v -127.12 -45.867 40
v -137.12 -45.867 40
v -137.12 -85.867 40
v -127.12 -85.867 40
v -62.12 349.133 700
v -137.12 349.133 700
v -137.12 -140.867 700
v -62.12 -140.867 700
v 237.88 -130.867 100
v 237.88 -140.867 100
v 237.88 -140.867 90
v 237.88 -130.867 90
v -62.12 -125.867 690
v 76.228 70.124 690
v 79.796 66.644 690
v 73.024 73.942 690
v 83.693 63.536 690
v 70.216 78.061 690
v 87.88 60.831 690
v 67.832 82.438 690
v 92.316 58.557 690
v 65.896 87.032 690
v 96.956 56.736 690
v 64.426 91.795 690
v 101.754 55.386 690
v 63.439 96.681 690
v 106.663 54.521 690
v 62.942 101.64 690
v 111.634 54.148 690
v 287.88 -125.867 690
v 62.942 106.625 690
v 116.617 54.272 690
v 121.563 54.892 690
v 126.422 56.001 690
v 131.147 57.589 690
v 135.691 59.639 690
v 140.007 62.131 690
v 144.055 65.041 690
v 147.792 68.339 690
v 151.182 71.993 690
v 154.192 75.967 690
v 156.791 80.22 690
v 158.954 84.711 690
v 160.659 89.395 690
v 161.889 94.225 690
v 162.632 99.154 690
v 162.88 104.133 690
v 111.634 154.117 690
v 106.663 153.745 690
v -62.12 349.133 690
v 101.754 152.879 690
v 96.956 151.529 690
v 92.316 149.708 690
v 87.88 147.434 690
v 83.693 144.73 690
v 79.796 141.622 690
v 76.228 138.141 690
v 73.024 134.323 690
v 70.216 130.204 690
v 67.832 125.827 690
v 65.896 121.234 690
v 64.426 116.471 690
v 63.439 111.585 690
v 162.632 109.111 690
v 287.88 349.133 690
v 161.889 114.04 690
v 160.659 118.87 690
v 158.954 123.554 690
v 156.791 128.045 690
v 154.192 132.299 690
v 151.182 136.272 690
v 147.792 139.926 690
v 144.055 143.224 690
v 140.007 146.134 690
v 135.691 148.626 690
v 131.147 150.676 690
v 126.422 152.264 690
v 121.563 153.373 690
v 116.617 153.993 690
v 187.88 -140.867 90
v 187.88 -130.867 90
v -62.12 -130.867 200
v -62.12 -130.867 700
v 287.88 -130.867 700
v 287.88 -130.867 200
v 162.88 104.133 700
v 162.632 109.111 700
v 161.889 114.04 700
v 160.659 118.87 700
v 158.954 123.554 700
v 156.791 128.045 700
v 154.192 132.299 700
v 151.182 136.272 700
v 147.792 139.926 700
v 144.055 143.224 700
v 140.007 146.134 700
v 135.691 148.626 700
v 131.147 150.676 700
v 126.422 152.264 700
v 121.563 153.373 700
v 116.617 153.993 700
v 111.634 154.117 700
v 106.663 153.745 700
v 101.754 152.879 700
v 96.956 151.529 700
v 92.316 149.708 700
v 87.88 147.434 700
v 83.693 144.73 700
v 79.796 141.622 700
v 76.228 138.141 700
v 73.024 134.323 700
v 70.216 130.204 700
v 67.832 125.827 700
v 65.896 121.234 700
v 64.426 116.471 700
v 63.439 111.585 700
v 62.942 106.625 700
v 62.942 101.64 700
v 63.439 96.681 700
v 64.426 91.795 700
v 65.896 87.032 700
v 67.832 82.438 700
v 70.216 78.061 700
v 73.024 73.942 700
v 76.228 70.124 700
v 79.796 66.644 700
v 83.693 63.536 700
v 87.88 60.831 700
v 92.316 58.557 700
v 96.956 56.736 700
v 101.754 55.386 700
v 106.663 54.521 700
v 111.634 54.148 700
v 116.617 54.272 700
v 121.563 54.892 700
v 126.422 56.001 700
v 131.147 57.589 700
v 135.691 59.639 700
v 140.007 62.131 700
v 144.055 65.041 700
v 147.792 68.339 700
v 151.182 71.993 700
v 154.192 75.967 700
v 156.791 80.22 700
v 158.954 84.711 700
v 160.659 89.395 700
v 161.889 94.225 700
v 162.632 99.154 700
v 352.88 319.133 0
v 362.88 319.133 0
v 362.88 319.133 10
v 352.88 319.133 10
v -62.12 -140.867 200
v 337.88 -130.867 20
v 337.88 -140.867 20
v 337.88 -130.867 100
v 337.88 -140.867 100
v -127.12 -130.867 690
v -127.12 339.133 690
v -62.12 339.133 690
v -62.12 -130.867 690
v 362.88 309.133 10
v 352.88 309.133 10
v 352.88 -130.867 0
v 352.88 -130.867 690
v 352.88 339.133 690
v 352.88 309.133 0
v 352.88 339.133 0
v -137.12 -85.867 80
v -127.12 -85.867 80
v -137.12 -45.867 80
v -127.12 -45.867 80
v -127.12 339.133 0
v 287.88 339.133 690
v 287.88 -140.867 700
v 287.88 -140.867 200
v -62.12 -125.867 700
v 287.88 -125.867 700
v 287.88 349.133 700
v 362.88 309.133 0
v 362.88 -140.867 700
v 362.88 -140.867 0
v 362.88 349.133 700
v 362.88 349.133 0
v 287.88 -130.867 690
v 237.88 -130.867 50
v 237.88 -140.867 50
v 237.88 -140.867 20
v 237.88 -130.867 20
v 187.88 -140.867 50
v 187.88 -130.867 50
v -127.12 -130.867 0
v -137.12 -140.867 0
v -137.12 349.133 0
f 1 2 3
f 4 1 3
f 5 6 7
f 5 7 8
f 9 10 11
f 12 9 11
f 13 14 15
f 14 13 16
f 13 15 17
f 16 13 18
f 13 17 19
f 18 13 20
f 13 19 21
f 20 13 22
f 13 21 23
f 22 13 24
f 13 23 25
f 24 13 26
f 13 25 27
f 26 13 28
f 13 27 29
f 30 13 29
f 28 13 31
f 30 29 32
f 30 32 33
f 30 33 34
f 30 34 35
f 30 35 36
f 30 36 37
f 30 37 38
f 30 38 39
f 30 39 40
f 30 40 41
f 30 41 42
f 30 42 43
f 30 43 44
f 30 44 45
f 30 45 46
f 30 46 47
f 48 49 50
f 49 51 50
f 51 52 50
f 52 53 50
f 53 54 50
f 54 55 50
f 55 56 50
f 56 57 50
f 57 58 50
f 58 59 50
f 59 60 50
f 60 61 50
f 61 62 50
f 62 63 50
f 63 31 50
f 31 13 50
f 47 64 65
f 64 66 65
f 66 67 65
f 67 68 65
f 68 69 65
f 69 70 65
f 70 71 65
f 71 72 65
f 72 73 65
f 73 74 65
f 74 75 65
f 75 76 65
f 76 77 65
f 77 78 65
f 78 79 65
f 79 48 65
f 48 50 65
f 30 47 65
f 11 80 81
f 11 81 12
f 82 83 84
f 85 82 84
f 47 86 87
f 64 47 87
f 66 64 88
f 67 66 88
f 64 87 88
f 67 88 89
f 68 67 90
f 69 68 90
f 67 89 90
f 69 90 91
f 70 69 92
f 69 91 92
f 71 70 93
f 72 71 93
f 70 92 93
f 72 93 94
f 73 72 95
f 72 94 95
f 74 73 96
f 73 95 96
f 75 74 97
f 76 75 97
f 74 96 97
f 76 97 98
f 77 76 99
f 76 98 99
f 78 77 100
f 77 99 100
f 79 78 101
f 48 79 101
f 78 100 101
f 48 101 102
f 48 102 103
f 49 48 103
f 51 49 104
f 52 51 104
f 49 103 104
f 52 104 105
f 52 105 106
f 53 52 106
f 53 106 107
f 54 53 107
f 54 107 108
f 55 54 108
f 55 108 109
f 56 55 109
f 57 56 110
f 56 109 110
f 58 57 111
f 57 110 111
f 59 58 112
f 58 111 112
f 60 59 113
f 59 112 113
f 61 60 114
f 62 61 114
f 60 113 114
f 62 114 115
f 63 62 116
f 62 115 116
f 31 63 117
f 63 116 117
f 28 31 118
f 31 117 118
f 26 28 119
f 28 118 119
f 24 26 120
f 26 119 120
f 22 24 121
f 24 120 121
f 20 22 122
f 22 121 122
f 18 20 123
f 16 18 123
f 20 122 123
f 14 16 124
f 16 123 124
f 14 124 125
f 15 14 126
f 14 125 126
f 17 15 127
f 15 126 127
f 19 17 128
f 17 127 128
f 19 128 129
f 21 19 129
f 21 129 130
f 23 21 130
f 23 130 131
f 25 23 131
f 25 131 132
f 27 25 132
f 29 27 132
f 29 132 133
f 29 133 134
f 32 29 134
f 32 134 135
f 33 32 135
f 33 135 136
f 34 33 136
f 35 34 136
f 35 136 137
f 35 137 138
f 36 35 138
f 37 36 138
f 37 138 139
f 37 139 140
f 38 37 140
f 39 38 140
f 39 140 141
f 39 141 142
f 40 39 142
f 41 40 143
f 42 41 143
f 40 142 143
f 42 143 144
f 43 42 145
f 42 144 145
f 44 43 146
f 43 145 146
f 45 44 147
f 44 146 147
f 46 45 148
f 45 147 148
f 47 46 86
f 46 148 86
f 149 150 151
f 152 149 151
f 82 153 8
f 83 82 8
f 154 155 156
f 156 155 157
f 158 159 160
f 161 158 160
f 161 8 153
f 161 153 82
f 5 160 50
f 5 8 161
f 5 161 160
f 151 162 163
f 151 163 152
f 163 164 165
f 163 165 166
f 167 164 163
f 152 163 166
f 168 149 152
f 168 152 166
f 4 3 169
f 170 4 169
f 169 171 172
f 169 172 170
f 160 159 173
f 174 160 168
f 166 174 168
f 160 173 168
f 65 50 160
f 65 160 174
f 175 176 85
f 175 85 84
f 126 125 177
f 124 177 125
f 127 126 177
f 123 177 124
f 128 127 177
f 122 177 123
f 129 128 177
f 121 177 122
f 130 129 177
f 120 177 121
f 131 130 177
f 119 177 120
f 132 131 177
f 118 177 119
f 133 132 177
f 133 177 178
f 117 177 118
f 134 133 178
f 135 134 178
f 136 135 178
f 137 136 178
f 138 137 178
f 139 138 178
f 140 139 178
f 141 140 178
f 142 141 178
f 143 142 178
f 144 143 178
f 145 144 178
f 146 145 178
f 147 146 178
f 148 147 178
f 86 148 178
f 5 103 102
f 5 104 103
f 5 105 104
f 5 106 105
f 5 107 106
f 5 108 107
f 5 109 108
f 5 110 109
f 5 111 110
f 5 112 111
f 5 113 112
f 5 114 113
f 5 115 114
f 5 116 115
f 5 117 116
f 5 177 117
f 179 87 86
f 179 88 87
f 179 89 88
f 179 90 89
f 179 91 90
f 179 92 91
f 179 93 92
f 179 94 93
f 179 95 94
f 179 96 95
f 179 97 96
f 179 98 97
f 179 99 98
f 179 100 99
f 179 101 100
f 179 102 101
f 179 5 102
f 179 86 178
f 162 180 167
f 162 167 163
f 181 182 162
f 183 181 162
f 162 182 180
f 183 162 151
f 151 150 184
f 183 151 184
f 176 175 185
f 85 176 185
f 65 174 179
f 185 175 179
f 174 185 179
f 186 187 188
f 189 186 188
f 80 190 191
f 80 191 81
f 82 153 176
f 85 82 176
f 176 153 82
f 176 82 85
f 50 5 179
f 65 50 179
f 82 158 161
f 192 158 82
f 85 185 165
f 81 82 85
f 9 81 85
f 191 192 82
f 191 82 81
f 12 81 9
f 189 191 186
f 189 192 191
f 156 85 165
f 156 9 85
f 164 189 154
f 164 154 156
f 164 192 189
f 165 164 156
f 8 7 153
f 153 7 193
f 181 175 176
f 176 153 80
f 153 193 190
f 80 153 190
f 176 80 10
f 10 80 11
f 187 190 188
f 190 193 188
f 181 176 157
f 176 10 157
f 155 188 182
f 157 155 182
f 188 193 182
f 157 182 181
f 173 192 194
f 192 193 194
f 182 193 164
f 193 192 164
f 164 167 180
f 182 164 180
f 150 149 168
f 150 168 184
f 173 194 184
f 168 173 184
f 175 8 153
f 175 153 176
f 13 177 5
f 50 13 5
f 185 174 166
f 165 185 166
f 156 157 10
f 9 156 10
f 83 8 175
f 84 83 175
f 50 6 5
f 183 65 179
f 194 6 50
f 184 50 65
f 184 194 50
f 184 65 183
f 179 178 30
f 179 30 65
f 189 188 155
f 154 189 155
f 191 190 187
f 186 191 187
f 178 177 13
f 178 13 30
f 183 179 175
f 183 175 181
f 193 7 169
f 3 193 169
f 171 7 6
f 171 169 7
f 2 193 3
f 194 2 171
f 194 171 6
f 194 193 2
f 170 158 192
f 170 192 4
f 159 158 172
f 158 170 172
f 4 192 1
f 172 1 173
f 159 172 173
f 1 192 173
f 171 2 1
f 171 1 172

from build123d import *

# Parameters (mm, degrees)
F0_W      = 500
F0_H      = 490
F0_W_2    = 480
F0_H_2    = 470
F1_DEPTH  = 700
F2_W      = 480
F2_H      = 470
F3_DEPTH  = 10
F4_W      = 50
F4_H      = 40
F5_DEPTH  = 25
F6_W      = 40
F6_H      = 40
F7_DEPTH  = 25
F8_W      = 10
F8_H      = 10
F9_DEPTH  = 25
F10_W     = 350
F10_H     = 500
F11_DEPTH = 15
F12_DEPTH = 10
F13_W     = 350
F13_H     = 475
F14_DEPTH = 10
F15_DEPTH = 10
F16_R     = 50
F17_DEPTH = 10


with BuildPart() as f1:
    # F0 (on Top) → F1 (new body)
    with BuildSketch(Plane.XY):
        with Locations((112.8801819126, 104.1326503491)):
            Rectangle(F0_W, F0_H)
        with Locations((112.8801819126, 104.1326503491)):
            Rectangle(F0_W_2, F0_H_2, mode=Mode.SUBTRACT)
    extrude(amount=F1_DEPTH)

    # F2 (on face) → F3 (join)
    with BuildSketch(Plane.XY.offset(700)):
        with Locations((112.8801819126, 104.1326503491)):
            Rectangle(F2_W, F2_H)
    extrude(amount=-F3_DEPTH)

    # F4 (on face) → F5 (cut)
    with BuildSketch(Plane.XZ.offset(140.8673496509)):
        Polygon((237.8801819126, 20), (337.8801819126, 20), (337.8801819126, 100), (237.8801819126, 100), (237.8801819126, 90), (237.8801819126, 50), align=None)
        with Locations((212.8801819126, 70)):
            Rectangle(F4_W, F4_H)
    extrude(amount=-F5_DEPTH, mode=Mode.SUBTRACT)

    # F6 (on face) → F7 (cut)
    with BuildSketch(Plane(origin=(-137.1198180874, 0, 0), x_dir=(0, -1, 0), z_dir=(-1, 0, 0))):
        with Locations((65.8673496509, 60)):
            Rectangle(F6_W, F6_H)
    extrude(amount=-F7_DEPTH, mode=Mode.SUBTRACT)

    # F8 (on face) → F9 (cut)
    with BuildSketch(Plane.YZ.offset(362.8801819126)):
        with Locations((314.1326503491, 5)):
            Rectangle(F8_W, F8_H)
    extrude(amount=-F9_DEPTH, mode=Mode.SUBTRACT)

    # F10 (on face) → F11 (cut)
    with BuildSketch(Plane.XZ.offset(140.8673496509)):
        with Locations((112.8801819126, 450)):
            Rectangle(F10_W, F10_H)
    extrude(amount=-F11_DEPTH, mode=Mode.SUBTRACT)

    # F13 (on face) → F14 (cut)
    with BuildSketch(Plane.XY.offset(700)):
        with Locations((112.8801819126, 111.6326503491)):
            Rectangle(F13_W, F13_H)
    extrude(amount=-F14_DEPTH, mode=Mode.SUBTRACT)


with BuildPart() as f12:
    # F10 (on face) → F12 (new body)
    with BuildSketch(Plane.XZ.offset(140.8673496509)):
        with Locations((112.8801819126, 450)):
            Rectangle(F10_W, F10_H)
    extrude(amount=-F12_DEPTH)


with BuildPart() as f15:
    # F13 (on face) → F15 (new body)
    with BuildSketch(Plane.XY.offset(700)):
        with Locations((112.8801819126, 111.6326503491)):
            Rectangle(F13_W, F13_H)
    extrude(amount=-F15_DEPTH)

    # F16 (on face) → F17 (cut)
    with BuildSketch(Plane.XY.offset(700)):
        with Locations((112.8801819126, 104.1326503491)):
            Circle(F16_R)
    extrude(amount=-F17_DEPTH, mode=Mode.SUBTRACT)


solid = Compound([f1.part, f12.part, f15.part])
